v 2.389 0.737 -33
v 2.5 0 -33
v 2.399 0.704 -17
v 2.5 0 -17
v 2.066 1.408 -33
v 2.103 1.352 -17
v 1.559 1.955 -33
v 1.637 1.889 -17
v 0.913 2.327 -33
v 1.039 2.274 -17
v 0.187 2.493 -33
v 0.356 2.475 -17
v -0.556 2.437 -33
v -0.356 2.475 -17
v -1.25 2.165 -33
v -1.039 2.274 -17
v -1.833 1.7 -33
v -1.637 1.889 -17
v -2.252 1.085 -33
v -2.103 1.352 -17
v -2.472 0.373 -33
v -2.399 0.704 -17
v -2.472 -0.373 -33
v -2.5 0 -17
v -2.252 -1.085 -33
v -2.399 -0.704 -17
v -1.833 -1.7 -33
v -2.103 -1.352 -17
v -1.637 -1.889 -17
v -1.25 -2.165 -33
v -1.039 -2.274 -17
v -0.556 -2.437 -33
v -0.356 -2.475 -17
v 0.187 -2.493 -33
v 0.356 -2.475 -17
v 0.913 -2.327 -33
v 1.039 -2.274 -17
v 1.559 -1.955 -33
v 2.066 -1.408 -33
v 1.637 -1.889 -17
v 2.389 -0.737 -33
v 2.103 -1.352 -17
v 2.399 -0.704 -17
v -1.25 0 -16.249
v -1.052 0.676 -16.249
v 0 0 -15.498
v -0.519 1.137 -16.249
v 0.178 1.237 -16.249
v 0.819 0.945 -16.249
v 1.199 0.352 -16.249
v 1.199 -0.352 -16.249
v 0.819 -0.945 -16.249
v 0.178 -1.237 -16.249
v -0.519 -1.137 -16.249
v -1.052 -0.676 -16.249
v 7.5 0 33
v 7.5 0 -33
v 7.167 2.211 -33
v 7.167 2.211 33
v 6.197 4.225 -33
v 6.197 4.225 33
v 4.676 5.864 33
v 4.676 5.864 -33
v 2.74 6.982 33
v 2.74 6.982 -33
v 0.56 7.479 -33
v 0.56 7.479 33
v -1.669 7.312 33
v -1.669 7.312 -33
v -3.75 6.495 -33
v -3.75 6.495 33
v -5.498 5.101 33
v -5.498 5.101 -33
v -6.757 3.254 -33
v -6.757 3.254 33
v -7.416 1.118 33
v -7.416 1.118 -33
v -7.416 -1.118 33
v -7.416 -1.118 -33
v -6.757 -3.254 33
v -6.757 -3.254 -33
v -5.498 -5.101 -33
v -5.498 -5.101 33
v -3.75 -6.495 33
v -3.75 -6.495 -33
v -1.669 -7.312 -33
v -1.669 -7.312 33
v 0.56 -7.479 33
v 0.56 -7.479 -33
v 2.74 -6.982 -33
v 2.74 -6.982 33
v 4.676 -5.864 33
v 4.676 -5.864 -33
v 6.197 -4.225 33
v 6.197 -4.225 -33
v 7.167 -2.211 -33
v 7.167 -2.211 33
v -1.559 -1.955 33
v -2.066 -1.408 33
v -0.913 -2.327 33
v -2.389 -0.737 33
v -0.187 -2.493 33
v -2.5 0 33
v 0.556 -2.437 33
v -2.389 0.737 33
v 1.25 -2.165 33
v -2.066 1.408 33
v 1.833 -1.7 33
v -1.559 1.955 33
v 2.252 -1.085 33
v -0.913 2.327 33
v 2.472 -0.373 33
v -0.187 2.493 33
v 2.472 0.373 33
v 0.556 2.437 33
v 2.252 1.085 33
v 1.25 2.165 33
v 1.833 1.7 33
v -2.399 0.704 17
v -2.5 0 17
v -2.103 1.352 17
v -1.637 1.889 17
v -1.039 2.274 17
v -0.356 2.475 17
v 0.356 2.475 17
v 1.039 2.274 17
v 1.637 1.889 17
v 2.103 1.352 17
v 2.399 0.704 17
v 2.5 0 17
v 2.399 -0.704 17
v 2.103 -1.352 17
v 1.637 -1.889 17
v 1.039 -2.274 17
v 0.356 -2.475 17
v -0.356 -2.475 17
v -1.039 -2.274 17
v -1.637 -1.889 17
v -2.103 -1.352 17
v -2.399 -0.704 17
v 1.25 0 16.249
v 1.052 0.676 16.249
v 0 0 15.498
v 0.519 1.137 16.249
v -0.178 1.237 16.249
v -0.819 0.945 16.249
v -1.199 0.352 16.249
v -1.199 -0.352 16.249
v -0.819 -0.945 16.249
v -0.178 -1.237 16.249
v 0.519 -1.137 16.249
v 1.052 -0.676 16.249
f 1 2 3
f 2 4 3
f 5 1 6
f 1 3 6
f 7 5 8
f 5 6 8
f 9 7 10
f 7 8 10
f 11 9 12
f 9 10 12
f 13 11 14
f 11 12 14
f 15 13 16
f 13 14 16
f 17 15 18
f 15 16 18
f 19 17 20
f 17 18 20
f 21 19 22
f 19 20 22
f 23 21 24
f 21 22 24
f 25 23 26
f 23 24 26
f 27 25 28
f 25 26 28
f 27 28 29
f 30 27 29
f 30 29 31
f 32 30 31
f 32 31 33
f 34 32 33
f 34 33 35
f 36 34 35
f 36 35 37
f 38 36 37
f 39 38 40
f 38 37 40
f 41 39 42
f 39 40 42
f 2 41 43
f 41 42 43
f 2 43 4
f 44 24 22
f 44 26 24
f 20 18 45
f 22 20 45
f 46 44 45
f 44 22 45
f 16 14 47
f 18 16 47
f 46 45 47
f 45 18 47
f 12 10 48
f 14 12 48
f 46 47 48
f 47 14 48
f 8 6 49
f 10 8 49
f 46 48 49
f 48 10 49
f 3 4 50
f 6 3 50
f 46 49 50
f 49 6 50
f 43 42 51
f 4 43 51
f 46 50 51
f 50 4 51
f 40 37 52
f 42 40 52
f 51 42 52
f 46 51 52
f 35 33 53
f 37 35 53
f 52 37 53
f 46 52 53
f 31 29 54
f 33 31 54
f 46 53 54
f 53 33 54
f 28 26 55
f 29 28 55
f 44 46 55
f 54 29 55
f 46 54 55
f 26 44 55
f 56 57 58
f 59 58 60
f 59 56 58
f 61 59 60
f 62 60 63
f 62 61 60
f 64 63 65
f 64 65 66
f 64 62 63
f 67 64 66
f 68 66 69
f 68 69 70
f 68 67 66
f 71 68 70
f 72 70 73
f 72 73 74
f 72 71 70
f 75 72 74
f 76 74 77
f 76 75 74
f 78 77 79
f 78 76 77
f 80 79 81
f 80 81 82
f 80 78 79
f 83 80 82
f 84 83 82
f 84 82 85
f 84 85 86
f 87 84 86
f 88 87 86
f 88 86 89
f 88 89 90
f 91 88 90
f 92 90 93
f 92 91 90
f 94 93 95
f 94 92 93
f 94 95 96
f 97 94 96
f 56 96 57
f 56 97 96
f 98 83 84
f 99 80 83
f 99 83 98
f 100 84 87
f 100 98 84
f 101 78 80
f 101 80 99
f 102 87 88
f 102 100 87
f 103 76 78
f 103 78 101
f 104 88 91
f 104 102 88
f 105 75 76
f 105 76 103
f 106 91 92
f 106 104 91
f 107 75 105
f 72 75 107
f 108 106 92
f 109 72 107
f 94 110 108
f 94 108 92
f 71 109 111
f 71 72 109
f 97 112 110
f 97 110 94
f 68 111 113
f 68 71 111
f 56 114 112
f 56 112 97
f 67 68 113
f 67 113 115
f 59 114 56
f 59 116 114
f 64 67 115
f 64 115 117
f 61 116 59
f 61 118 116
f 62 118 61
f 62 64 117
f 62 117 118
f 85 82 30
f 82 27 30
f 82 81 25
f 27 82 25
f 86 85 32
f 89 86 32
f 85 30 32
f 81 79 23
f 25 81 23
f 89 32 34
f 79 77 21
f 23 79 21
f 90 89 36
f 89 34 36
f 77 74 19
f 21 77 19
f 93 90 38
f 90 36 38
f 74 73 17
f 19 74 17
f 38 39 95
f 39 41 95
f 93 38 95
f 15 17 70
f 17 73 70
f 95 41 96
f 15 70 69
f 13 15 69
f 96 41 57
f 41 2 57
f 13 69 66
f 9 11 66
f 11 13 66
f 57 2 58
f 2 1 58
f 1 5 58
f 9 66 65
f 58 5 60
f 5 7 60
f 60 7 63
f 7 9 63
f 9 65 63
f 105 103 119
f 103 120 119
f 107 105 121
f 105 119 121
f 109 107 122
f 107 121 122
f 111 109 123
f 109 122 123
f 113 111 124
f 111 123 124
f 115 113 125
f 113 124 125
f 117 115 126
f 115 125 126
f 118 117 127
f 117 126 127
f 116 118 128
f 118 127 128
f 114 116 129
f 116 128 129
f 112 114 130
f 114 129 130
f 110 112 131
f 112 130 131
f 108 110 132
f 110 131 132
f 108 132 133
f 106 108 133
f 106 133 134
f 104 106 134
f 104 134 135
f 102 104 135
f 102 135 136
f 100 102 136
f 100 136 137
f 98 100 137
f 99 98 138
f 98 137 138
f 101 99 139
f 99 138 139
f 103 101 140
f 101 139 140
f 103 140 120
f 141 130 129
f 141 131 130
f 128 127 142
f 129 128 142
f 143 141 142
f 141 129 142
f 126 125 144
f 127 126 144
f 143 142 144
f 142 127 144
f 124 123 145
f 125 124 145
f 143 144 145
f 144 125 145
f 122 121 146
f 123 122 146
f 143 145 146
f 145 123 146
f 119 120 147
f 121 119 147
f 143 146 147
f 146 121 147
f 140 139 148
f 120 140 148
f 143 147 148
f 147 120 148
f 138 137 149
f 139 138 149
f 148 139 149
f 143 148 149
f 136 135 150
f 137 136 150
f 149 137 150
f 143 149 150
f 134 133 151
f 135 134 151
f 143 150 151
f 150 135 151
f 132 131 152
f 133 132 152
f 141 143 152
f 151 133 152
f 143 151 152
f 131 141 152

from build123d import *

# Parameters (mm, degrees)
SKETCH1_R             = 7.5
BOSS_EXTRUDE1_DEPTH   = 33
M6_TAPPED_HOLE1_D     = 5
M6_TAPPED_HOLE1_DEPTH = 16
M6_TAPPED_HOLE1_TIP   = 1.502151548
M6_TAPPED_HOLE2_D     = 5
M6_TAPPED_HOLE2_DEPTH = 16
M6_TAPPED_HOLE2_TIP   = 1.502151548


with BuildPart() as part:
    # Sketch1 → Boss-Extrude1 (new, symmetric)
    with BuildSketch(Plane.XY):
        Circle(SKETCH1_R)
    extrude(amount=BOSS_EXTRUDE1_DEPTH, both=True)

    # M6 Tapped Hole1
    with Locations(Plane.XY.offset(33)):
        with Locations((0, 0)):
            Hole(M6_TAPPED_HOLE1_D / 2, depth=M6_TAPPED_HOLE1_DEPTH)
            with Locations((0, 0, -(M6_TAPPED_HOLE1_DEPTH + M6_TAPPED_HOLE1_TIP / 2))):  # 118° drill point
                Cone(0, M6_TAPPED_HOLE1_D / 2, M6_TAPPED_HOLE1_TIP, mode=Mode.SUBTRACT)

    # M6 Tapped Hole2
    with Locations(Plane(origin=(0, 0, -33), x_dir=(-1, 0, 0), z_dir=(0, 0, -1))):
        with Locations((0, 0)):
            Hole(M6_TAPPED_HOLE2_D / 2, depth=M6_TAPPED_HOLE2_DEPTH)
            with Locations((0, 0, -(M6_TAPPED_HOLE2_DEPTH + M6_TAPPED_HOLE2_TIP / 2))):  # 118° drill point
                Cone(0, M6_TAPPED_HOLE2_D / 2, M6_TAPPED_HOLE2_TIP, mode=Mode.SUBTRACT)


solid = part.part
